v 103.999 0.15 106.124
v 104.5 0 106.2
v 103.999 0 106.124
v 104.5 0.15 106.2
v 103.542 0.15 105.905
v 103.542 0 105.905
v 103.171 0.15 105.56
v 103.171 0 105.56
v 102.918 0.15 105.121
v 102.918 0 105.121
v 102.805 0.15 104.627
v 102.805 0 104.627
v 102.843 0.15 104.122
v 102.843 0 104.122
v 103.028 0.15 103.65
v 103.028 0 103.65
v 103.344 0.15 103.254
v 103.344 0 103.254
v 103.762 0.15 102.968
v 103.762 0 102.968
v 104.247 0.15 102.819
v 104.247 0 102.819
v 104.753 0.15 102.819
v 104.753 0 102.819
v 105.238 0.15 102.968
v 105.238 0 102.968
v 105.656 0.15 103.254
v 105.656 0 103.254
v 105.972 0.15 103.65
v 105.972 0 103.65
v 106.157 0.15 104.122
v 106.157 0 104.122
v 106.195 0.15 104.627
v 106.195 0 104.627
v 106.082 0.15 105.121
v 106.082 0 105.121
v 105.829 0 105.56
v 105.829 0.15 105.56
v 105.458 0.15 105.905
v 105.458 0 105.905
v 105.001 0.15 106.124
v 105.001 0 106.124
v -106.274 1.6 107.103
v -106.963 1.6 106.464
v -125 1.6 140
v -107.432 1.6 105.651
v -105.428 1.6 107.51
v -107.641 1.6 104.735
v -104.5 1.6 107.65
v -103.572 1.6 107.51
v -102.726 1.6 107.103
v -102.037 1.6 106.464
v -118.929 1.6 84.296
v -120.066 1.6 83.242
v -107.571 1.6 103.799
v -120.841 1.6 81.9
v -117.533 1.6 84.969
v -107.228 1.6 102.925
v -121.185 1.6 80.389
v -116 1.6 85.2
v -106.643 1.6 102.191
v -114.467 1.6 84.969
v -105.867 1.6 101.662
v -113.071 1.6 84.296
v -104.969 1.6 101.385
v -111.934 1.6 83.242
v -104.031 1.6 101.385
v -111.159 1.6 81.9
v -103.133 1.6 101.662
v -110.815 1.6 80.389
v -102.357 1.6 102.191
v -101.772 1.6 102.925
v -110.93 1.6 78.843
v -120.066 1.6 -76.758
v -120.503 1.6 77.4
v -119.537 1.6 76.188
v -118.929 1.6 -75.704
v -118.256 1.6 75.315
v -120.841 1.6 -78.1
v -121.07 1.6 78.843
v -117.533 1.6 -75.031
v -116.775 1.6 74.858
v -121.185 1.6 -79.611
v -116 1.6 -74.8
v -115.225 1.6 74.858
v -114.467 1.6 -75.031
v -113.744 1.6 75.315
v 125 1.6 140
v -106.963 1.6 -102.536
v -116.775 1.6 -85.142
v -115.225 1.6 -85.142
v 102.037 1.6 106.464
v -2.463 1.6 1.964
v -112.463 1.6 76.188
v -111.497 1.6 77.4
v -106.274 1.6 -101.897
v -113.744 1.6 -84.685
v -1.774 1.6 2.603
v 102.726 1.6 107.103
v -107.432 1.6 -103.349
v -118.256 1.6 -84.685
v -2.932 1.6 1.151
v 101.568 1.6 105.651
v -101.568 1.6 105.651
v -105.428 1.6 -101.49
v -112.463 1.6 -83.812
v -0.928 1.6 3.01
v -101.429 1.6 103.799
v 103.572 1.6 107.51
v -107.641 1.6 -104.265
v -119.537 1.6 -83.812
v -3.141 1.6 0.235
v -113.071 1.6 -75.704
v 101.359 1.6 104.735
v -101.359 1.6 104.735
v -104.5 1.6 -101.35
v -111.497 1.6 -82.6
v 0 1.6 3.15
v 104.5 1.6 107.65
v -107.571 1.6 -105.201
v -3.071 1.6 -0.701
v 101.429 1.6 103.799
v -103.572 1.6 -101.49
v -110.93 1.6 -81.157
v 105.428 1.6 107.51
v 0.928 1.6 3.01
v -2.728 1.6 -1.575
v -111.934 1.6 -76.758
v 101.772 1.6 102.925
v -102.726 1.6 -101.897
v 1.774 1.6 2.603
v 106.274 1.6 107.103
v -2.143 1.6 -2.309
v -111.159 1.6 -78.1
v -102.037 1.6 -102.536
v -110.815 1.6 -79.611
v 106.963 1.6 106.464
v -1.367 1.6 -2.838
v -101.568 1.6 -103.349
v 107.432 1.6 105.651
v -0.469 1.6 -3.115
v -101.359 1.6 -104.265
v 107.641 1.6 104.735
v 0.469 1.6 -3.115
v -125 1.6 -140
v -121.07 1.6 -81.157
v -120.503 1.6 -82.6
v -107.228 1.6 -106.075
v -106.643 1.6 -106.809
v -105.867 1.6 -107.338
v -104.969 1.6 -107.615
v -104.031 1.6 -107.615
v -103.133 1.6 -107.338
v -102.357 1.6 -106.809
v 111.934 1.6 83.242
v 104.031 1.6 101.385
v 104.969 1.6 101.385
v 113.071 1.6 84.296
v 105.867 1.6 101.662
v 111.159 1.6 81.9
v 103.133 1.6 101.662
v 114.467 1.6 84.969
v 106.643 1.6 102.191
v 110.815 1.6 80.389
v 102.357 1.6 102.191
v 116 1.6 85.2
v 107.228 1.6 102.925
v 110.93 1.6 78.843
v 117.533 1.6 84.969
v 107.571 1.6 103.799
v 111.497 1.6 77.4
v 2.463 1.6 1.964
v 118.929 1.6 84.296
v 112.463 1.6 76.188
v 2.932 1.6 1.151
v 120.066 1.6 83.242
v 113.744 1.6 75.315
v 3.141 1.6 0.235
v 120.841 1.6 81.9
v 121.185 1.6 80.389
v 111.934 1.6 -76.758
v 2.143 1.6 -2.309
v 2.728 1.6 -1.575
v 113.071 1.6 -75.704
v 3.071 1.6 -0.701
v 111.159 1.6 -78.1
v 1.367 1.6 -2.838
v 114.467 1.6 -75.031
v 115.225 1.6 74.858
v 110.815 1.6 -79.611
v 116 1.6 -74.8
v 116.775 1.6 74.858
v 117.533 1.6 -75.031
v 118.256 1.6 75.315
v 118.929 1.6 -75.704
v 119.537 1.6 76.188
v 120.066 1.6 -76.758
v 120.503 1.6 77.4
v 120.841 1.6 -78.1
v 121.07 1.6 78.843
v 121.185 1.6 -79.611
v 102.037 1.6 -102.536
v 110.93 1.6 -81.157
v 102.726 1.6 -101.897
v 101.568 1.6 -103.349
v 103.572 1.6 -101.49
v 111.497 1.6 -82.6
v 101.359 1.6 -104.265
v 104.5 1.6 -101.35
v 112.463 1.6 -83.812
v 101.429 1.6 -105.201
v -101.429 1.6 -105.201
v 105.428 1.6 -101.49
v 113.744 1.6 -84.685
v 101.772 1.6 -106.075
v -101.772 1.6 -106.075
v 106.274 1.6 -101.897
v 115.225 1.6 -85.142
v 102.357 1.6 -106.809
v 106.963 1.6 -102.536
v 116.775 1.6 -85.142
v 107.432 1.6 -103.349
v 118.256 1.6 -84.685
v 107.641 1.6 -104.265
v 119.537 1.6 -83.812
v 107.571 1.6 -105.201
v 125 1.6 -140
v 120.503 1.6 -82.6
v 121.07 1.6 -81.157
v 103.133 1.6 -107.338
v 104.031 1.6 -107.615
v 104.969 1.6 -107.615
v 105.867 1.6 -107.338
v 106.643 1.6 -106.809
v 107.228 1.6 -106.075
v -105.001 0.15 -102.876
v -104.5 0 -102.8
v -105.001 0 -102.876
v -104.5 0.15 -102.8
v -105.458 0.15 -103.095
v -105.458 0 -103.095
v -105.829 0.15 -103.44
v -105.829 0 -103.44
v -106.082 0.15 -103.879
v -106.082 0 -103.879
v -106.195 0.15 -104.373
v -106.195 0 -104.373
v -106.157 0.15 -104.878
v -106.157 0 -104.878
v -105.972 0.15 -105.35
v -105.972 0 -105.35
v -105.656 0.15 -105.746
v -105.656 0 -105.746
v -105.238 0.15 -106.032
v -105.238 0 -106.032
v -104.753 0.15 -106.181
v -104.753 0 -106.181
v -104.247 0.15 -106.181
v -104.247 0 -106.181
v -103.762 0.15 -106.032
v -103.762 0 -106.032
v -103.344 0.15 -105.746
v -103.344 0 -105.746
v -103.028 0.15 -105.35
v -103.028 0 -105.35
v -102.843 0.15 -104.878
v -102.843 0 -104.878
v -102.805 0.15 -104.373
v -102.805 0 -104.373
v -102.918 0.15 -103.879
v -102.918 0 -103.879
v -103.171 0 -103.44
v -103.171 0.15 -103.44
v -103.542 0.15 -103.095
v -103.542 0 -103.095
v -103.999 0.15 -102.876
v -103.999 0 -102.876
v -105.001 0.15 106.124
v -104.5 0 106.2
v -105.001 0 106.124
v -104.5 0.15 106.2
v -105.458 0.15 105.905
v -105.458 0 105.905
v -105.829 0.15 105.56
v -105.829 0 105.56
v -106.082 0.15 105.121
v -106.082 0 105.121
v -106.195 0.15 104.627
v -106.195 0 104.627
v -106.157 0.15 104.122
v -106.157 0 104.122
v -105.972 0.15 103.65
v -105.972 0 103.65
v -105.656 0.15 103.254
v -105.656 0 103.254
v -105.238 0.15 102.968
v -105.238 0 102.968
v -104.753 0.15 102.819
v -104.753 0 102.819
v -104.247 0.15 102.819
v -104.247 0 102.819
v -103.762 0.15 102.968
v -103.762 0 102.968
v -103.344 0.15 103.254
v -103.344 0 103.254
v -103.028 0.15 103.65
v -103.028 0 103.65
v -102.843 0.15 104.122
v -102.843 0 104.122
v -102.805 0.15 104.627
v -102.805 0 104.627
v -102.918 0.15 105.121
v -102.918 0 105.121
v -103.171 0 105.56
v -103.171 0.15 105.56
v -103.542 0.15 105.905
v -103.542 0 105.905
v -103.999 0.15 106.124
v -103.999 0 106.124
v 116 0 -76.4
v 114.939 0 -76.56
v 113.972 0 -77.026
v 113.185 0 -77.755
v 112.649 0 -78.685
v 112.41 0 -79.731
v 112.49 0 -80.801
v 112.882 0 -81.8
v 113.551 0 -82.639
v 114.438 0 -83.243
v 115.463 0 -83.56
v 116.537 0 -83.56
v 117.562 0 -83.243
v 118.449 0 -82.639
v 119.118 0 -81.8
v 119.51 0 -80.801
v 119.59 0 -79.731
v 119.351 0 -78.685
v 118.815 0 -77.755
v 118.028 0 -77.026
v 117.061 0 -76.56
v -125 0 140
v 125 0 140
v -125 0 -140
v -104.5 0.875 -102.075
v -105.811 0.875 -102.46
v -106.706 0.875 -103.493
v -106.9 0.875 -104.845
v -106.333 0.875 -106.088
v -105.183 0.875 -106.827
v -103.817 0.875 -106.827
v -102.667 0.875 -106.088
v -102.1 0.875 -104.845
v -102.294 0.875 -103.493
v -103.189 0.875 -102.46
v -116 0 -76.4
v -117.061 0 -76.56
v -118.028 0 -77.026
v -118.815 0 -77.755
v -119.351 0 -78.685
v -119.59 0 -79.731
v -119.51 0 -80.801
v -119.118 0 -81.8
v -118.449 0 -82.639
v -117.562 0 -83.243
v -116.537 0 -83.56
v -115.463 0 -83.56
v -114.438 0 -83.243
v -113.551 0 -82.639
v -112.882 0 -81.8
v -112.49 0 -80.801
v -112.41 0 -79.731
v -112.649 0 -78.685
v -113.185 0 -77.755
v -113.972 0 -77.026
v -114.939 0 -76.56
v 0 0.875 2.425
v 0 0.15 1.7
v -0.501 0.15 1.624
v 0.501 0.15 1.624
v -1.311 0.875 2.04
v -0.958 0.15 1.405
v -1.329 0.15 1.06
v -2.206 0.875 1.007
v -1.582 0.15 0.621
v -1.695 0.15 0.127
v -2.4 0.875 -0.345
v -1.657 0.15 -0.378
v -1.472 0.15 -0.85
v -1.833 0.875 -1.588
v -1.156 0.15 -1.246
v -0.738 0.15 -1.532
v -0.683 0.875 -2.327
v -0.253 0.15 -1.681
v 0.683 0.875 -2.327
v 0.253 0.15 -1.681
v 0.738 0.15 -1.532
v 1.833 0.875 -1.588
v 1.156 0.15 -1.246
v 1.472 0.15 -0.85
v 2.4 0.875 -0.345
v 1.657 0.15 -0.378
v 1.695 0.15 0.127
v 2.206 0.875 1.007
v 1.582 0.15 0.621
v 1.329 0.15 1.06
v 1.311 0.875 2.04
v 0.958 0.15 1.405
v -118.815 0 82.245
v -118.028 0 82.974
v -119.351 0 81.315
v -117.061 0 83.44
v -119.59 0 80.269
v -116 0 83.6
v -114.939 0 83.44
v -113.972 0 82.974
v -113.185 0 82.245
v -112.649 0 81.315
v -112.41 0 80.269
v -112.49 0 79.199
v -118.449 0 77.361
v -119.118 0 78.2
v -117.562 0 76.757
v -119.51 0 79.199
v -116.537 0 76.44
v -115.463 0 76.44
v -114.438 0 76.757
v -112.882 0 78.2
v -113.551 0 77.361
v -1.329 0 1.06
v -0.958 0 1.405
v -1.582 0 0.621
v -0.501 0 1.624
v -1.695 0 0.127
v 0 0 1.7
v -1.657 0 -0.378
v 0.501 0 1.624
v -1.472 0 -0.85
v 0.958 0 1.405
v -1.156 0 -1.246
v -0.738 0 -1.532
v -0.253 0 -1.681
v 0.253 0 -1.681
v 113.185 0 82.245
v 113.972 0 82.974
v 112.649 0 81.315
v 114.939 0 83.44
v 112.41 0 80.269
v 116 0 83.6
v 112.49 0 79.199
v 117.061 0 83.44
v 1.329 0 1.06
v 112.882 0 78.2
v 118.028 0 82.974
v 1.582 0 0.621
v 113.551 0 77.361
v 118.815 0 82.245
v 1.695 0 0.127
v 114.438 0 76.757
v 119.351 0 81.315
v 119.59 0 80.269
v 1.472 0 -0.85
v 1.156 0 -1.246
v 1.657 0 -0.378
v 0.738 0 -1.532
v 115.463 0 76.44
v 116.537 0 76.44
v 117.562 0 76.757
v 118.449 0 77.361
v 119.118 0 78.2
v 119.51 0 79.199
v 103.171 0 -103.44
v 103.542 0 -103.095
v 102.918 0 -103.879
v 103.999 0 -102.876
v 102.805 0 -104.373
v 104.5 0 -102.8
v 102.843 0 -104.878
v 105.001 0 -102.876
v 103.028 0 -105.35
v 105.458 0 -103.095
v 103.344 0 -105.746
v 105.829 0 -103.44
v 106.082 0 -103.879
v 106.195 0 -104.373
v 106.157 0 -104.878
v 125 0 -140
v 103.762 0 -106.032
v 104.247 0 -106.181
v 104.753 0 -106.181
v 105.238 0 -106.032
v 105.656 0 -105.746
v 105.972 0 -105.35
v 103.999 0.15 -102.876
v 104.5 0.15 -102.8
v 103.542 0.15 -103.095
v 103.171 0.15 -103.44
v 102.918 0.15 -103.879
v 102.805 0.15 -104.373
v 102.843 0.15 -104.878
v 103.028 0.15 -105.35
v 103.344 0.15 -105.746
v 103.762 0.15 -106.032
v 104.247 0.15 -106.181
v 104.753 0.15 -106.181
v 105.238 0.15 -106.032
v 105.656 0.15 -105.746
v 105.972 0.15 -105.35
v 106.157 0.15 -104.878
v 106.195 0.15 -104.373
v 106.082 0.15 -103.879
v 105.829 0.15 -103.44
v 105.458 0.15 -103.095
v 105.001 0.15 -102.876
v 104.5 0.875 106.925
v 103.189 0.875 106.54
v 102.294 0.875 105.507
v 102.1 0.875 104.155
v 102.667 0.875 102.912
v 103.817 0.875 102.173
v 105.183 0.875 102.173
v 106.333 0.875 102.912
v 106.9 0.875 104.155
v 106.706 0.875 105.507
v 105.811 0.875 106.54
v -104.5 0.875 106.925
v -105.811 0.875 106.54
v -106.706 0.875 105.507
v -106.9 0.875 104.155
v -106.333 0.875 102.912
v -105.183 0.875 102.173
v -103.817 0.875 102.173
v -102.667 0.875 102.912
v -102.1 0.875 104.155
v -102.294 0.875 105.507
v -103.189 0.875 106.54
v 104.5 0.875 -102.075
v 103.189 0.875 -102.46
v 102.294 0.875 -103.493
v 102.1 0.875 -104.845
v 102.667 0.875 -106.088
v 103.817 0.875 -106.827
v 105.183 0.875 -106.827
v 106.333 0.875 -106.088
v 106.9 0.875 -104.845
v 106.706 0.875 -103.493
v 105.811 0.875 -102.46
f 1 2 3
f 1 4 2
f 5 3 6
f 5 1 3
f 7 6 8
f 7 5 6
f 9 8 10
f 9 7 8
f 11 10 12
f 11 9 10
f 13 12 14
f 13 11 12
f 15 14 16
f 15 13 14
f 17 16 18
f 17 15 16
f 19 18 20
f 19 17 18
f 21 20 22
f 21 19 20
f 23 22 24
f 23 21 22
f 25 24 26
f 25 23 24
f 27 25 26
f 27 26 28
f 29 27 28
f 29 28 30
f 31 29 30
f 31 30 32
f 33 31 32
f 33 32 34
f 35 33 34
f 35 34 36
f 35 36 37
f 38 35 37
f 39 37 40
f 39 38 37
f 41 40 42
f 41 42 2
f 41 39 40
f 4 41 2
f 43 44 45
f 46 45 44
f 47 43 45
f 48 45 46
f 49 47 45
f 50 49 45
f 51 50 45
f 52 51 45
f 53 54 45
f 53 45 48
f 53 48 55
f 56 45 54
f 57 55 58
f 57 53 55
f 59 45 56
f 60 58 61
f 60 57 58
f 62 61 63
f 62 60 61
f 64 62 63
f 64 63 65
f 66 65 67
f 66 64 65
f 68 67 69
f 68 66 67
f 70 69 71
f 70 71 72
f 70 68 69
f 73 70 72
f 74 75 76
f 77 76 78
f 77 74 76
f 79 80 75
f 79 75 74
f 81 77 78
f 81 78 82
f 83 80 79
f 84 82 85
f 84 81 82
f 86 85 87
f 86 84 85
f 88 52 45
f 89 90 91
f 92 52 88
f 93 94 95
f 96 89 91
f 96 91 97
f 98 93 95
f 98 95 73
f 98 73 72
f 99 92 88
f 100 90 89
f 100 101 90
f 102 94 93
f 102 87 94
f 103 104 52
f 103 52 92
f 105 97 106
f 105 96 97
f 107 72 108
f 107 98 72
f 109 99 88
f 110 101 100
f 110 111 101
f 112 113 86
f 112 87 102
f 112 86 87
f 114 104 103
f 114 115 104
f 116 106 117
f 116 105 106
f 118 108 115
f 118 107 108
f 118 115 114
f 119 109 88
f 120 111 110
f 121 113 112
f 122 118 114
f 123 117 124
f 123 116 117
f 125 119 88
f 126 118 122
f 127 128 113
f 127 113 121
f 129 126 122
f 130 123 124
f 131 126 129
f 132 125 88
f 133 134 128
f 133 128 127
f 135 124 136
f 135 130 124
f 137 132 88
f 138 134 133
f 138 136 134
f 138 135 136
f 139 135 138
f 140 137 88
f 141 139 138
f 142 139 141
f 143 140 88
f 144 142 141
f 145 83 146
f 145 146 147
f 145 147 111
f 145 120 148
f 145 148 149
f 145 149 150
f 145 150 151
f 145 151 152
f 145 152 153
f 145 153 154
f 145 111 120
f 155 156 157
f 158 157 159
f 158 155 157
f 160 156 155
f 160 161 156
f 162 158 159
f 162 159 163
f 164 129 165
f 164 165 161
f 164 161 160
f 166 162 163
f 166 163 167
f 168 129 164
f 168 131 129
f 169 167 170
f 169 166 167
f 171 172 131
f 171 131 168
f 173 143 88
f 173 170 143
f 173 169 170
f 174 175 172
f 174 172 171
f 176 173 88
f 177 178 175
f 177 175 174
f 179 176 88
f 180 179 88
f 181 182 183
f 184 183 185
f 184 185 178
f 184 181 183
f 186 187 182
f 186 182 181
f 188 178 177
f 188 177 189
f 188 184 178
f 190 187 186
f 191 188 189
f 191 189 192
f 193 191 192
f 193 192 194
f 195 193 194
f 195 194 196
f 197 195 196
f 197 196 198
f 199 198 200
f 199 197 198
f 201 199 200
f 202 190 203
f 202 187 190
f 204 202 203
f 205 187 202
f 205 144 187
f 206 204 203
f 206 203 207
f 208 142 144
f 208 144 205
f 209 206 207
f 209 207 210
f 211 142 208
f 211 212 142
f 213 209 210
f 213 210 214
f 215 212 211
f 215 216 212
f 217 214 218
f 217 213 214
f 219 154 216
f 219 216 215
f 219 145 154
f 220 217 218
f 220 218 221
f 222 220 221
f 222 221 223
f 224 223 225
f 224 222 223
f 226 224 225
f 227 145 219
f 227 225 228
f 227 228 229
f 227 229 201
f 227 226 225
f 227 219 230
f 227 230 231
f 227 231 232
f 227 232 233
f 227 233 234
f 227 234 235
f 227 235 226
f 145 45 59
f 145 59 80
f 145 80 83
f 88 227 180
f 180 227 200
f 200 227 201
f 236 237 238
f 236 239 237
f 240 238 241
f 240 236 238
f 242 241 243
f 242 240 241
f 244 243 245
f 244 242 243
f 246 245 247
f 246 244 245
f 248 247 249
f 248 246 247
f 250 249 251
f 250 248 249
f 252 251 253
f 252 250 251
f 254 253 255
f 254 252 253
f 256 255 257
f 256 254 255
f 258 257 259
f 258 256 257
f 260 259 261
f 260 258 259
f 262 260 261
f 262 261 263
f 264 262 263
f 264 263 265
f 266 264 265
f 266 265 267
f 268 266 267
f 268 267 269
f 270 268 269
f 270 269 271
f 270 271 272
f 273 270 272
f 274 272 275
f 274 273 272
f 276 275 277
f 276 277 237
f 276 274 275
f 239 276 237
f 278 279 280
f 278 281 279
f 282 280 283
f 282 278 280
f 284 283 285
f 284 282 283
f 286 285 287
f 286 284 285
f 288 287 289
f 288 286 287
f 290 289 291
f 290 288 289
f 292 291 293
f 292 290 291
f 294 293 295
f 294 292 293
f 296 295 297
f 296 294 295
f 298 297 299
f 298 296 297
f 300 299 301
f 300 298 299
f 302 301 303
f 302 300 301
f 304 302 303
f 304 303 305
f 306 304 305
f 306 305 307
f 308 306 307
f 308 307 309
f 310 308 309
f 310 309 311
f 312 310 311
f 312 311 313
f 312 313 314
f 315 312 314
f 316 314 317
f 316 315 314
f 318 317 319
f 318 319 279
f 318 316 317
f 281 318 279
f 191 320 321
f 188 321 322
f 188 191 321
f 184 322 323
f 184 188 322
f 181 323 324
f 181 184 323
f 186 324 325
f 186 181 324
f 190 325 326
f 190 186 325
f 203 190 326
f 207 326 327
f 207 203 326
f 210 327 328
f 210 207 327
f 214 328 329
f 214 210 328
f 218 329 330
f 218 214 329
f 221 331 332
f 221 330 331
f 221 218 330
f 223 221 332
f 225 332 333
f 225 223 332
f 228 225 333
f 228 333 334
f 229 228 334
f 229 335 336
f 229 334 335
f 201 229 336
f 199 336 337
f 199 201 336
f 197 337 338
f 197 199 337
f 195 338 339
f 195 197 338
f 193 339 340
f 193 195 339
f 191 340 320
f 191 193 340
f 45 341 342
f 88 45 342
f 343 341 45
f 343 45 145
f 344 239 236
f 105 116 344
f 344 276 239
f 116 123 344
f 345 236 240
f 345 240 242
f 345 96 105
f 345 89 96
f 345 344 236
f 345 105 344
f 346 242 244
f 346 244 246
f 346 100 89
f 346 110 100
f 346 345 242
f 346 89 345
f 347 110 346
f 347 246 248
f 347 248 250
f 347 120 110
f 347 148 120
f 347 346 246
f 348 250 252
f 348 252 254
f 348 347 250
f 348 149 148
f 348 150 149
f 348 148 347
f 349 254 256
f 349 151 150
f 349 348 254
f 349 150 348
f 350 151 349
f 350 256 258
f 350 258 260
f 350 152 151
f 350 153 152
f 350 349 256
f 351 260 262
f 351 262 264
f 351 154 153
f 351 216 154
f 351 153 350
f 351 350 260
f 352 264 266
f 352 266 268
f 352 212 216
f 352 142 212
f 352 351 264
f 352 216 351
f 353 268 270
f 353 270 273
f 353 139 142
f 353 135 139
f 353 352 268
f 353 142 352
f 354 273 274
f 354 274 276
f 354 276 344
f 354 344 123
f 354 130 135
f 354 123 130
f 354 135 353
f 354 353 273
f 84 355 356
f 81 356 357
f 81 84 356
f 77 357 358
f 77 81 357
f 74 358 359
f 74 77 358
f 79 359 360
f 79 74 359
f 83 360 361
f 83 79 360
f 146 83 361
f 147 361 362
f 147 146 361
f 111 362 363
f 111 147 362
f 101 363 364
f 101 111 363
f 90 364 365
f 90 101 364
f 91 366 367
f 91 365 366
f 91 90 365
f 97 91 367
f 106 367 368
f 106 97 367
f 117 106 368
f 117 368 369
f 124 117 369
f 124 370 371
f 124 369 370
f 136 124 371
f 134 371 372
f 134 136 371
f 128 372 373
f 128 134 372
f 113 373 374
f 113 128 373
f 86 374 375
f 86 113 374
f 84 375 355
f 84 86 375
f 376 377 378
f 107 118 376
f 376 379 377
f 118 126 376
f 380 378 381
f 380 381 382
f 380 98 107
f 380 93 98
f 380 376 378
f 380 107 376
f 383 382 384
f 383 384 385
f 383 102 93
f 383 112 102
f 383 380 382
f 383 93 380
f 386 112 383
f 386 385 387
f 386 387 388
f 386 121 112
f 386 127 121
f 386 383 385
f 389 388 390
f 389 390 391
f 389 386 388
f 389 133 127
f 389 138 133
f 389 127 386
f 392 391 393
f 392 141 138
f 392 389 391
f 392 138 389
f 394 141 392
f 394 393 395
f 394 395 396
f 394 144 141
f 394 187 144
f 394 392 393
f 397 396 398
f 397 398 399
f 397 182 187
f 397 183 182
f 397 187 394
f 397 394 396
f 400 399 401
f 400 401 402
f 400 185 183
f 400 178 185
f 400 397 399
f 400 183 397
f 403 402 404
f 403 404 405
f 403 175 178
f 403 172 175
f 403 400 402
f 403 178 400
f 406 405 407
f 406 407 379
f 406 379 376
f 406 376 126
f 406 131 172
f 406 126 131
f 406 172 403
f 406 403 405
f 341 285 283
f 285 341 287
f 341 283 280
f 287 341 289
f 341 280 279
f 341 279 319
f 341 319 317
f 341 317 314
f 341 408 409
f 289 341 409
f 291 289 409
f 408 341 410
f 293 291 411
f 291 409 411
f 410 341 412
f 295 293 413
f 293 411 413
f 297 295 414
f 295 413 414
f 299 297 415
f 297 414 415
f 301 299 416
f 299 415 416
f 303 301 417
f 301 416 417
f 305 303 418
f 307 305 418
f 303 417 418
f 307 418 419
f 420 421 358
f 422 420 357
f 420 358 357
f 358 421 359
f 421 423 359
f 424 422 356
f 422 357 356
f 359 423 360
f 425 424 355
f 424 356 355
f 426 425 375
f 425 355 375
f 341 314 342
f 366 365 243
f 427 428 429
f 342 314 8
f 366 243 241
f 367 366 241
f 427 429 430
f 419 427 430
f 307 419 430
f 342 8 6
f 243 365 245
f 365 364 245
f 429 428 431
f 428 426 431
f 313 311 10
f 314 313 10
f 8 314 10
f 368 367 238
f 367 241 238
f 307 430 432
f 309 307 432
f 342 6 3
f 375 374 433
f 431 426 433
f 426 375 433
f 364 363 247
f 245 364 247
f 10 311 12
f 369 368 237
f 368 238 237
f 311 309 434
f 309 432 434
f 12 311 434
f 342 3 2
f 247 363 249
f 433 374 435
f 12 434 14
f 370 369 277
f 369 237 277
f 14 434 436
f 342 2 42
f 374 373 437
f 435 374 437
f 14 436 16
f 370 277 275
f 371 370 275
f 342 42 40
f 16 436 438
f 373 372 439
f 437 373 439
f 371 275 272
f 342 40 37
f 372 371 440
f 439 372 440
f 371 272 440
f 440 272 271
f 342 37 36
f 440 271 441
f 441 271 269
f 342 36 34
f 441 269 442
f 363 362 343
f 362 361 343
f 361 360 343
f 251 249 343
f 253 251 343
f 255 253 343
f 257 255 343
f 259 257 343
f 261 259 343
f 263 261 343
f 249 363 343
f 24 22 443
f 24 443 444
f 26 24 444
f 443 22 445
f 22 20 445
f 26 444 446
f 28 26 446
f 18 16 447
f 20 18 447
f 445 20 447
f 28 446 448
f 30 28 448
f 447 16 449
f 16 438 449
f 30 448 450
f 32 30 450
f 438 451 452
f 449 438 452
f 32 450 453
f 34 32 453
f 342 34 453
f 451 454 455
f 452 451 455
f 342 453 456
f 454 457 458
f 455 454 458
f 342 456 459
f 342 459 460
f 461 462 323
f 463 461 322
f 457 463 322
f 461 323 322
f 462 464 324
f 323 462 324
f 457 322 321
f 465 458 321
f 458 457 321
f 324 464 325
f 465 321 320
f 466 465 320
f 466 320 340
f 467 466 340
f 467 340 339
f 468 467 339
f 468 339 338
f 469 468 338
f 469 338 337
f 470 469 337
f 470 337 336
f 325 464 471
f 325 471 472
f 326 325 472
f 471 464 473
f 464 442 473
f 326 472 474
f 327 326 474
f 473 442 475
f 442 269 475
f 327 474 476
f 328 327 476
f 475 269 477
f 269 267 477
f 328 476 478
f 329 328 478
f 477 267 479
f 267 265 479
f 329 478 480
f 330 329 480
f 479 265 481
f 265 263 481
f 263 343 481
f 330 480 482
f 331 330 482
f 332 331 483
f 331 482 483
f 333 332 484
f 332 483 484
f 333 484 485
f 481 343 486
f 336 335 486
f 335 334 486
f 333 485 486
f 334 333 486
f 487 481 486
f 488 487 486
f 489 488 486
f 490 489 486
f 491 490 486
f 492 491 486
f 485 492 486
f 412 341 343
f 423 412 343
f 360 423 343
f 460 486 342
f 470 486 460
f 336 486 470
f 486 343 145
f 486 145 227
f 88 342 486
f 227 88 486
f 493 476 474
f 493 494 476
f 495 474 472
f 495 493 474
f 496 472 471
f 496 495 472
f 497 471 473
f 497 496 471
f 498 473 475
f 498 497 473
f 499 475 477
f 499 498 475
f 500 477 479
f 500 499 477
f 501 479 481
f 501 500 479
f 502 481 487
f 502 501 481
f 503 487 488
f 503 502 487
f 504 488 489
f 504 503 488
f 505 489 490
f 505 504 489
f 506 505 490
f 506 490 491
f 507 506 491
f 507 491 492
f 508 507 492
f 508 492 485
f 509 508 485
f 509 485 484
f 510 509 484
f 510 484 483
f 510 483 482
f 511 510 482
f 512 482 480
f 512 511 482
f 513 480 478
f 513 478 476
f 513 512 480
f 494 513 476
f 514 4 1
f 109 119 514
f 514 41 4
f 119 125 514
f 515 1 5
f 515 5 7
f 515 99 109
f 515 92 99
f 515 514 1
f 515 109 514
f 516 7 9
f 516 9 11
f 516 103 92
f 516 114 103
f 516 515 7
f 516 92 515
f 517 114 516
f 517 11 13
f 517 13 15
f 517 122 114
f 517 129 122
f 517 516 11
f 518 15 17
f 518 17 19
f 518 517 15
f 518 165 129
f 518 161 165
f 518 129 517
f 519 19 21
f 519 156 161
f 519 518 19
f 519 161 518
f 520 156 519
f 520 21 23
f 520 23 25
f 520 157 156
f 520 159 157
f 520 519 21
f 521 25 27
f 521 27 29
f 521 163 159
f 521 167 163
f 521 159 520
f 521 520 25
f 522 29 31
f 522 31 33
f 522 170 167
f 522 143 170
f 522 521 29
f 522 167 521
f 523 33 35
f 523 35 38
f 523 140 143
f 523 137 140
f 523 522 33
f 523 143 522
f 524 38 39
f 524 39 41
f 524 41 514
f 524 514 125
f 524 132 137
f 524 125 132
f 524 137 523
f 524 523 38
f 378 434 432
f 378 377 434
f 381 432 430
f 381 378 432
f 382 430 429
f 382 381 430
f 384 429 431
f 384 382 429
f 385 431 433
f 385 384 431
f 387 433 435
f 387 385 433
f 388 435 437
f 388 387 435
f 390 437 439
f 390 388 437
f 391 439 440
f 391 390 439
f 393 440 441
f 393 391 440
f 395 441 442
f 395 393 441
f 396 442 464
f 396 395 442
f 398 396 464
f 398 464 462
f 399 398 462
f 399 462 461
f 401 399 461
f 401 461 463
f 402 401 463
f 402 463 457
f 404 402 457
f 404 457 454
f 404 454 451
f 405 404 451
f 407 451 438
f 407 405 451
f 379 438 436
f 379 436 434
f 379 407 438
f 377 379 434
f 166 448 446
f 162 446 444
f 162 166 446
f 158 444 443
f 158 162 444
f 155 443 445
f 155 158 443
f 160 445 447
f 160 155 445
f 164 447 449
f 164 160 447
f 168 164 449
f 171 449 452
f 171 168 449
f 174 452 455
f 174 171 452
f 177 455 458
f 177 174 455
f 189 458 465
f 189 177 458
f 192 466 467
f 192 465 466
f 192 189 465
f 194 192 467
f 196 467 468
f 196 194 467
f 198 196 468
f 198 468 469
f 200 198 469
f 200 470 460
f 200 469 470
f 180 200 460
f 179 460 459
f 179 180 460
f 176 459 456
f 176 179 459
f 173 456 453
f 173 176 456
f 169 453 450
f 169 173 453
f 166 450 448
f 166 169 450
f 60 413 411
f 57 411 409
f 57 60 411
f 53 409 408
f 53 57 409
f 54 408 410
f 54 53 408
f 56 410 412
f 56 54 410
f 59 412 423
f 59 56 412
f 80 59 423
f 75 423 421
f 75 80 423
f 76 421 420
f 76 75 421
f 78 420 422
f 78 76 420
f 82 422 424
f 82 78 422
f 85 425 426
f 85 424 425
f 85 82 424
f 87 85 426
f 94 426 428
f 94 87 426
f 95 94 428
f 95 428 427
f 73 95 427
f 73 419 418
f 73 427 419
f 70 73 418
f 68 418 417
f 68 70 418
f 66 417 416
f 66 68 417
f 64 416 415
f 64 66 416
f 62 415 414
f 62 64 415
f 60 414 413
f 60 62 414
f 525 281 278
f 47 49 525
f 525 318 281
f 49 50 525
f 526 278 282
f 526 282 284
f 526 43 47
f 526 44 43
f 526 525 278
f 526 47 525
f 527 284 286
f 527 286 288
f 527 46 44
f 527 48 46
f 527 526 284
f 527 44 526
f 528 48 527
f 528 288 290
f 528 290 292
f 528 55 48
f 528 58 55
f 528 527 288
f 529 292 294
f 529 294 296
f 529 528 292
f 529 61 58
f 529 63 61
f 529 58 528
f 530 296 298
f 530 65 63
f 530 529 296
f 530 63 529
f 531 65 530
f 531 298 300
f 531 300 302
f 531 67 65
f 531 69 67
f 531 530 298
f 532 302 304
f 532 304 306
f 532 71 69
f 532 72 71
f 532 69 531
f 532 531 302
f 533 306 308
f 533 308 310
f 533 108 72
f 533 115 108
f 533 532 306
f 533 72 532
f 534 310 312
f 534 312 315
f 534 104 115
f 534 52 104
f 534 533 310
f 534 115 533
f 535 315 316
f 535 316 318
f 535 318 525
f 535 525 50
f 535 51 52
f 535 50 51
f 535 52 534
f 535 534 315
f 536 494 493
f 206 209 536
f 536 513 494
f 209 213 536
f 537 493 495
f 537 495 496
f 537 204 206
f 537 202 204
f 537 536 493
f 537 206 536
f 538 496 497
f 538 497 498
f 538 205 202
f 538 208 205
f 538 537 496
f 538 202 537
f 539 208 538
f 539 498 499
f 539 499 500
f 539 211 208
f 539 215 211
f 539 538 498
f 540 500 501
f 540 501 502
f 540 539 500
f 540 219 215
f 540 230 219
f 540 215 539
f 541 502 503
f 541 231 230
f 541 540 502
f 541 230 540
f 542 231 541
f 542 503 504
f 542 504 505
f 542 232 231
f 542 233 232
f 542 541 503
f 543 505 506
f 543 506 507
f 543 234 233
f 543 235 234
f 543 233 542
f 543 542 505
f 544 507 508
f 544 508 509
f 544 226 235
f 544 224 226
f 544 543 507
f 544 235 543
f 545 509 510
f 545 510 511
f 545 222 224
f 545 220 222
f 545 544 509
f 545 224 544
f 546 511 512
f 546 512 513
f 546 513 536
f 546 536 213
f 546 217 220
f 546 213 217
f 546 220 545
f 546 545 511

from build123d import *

# Parameters (mm, degrees)
SKETCH1_W                                      = 250
SKETCH1_H                                      = 280
BOSS_EXTRUDE1_DEPTH                            = 1.6
CSK_FOR_M5_FLAT_HEAD_MACHINE_SCREW1_AT_2_COUNT = 2
CSK_FOR_M5_FLAT_HEAD_MACHINE_SCREW1_AT_2_PITCH = 232
CSK_FOR_M5_FLAT_HEAD_MACHINE_SCREW1_AT_3_COUNT = 2
CSK_FOR_M5_FLAT_HEAD_MACHINE_SCREW1_AT_3_PITCH = 281.822639261
CSK_FOR_M5_FLAT_HEAD_MACHINE_SCREW1_AT_4_COUNT = 2
CSK_FOR_M5_FLAT_HEAD_MACHINE_SCREW1_AT_4_PITCH = 160
CSK_FOR_M3_FLAT_HEAD_MACHINE_SCREW1_AT_2_COUNT = 2
CSK_FOR_M3_FLAT_HEAD_MACHINE_SCREW1_AT_2_PITCH = 147.785317268
CSK_FOR_M3_FLAT_HEAD_MACHINE_SCREW1_AT_3_COUNT = 2
CSK_FOR_M3_FLAT_HEAD_MACHINE_SCREW1_AT_3_PITCH = 147.785317268
CSK_FOR_M3_FLAT_HEAD_MACHINE_SCREW1_AT_4_COUNT = 2
CSK_FOR_M3_FLAT_HEAD_MACHINE_SCREW1_AT_4_PITCH = 147.785317268
CSK_FOR_M3_FLAT_HEAD_MACHINE_SCREW1_AT_5_COUNT = 2
CSK_FOR_M3_FLAT_HEAD_MACHINE_SCREW1_AT_5_PITCH = 147.785317268


with BuildPart() as part:
    # Sketch1 → Boss-Extrude1 (new body)
    with BuildSketch(Plane(origin=(0, 0, 0), x_dir=(1, 0, 0), z_dir=(0, 1, 0))):
        Rectangle(SKETCH1_W, SKETCH1_H)
    extrude(amount=BOSS_EXTRUDE1_DEPTH)

    # Sketch2 → CSK for M5 Flat Head Machine Screw1 (revolve, cut)
    with BuildSketch(Plane(origin=(-116, 1.6, -80), x_dir=(0, 0, 1), z_dir=(1, 0, 0))):
        Polygon((0, 0), (0, 1.6), (2.75, 1.6), (2.75, 2.45), (5.2, 0), align=None)
    csk_for_m5_flat_head_machine_screw1 = revolve(axis=Axis((-116, 7.95, -80), (0, -1, 0)), mode=Mode.SUBTRACT)

    # CSK for M5 Flat Head Machine Screw1 at 2: CSK for M5 Flat Head Machine Screw1 ×2
    with Locations(*[(i * CSK_FOR_M5_FLAT_HEAD_MACHINE_SCREW1_AT_2_PITCH, 0, 0) for i in range(1, CSK_FOR_M5_FLAT_HEAD_MACHINE_SCREW1_AT_2_COUNT)]):
        add(csk_for_m5_flat_head_machine_screw1, mode=Mode.SUBTRACT)

    # CSK for M5 Flat Head Machine Screw1 at 3: CSK for M5 Flat Head Machine Screw1 ×2
    with Locations(*[Vector(0.8232127859153064, 0, 0.5677329558036596) * (i * CSK_FOR_M5_FLAT_HEAD_MACHINE_SCREW1_AT_3_PITCH) for i in range(1, CSK_FOR_M5_FLAT_HEAD_MACHINE_SCREW1_AT_3_COUNT)]):
        add(csk_for_m5_flat_head_machine_screw1, mode=Mode.SUBTRACT)

    # CSK for M5 Flat Head Machine Screw1 at 4: CSK for M5 Flat Head Machine Screw1 ×2
    with Locations(*[(0, 0, i * CSK_FOR_M5_FLAT_HEAD_MACHINE_SCREW1_AT_4_PITCH) for i in range(1, CSK_FOR_M5_FLAT_HEAD_MACHINE_SCREW1_AT_4_COUNT)]):
        add(csk_for_m5_flat_head_machine_screw1, mode=Mode.SUBTRACT)

    # Sketch4 → CSK for M3 Flat Head Machine Screw1 (revolve, cut)
    with BuildSketch(Plane(origin=(0, 1.6, 0), x_dir=(0, 0, 1), z_dir=(1, 0, 0))):
        Polygon((0, 0), (0, 1.6), (1.7, 1.6), (1.7, 1.45), (3.15, 0), align=None)
    csk_for_m3_flat_head_machine_screw1 = revolve(axis=Axis((0, 7.95, 0), (0, -1, 0)), mode=Mode.SUBTRACT)

    # CSK for M3 Flat Head Machine Screw1 at 2: CSK for M3 Flat Head Machine Screw1 ×2
    with Locations(*[Vector(-0.7071067811865471, 0, 0.7071067811865479) * (i * CSK_FOR_M3_FLAT_HEAD_MACHINE_SCREW1_AT_2_PITCH) for i in range(1, CSK_FOR_M3_FLAT_HEAD_MACHINE_SCREW1_AT_2_COUNT)]):
        add(csk_for_m3_flat_head_machine_screw1, mode=Mode.SUBTRACT)

    # CSK for M3 Flat Head Machine Screw1 at 3: CSK for M3 Flat Head Machine Screw1 ×2
    with Locations(*[Vector(0.7071067811865477, 0, 0.7071067811865474) * (i * CSK_FOR_M3_FLAT_HEAD_MACHINE_SCREW1_AT_3_PITCH) for i in range(1, CSK_FOR_M3_FLAT_HEAD_MACHINE_SCREW1_AT_3_COUNT)]):
        add(csk_for_m3_flat_head_machine_screw1, mode=Mode.SUBTRACT)

    # CSK for M3 Flat Head Machine Screw1 at 4: CSK for M3 Flat Head Machine Screw1 ×2
    with Locations(*[Vector(0.7071067811865477, 0, -0.7071067811865475) * (i * CSK_FOR_M3_FLAT_HEAD_MACHINE_SCREW1_AT_4_PITCH) for i in range(1, CSK_FOR_M3_FLAT_HEAD_MACHINE_SCREW1_AT_4_COUNT)]):
        add(csk_for_m3_flat_head_machine_screw1, mode=Mode.SUBTRACT)

    # CSK for M3 Flat Head Machine Screw1 at 5: CSK for M3 Flat Head Machine Screw1 ×2
    with Locations(*[Vector(-0.7071067811865478, 0, -0.7071067811865474) * (i * CSK_FOR_M3_FLAT_HEAD_MACHINE_SCREW1_AT_5_PITCH) for i in range(1, CSK_FOR_M3_FLAT_HEAD_MACHINE_SCREW1_AT_5_COUNT)]):
        add(csk_for_m3_flat_head_machine_screw1, mode=Mode.SUBTRACT)


solid = part.part
